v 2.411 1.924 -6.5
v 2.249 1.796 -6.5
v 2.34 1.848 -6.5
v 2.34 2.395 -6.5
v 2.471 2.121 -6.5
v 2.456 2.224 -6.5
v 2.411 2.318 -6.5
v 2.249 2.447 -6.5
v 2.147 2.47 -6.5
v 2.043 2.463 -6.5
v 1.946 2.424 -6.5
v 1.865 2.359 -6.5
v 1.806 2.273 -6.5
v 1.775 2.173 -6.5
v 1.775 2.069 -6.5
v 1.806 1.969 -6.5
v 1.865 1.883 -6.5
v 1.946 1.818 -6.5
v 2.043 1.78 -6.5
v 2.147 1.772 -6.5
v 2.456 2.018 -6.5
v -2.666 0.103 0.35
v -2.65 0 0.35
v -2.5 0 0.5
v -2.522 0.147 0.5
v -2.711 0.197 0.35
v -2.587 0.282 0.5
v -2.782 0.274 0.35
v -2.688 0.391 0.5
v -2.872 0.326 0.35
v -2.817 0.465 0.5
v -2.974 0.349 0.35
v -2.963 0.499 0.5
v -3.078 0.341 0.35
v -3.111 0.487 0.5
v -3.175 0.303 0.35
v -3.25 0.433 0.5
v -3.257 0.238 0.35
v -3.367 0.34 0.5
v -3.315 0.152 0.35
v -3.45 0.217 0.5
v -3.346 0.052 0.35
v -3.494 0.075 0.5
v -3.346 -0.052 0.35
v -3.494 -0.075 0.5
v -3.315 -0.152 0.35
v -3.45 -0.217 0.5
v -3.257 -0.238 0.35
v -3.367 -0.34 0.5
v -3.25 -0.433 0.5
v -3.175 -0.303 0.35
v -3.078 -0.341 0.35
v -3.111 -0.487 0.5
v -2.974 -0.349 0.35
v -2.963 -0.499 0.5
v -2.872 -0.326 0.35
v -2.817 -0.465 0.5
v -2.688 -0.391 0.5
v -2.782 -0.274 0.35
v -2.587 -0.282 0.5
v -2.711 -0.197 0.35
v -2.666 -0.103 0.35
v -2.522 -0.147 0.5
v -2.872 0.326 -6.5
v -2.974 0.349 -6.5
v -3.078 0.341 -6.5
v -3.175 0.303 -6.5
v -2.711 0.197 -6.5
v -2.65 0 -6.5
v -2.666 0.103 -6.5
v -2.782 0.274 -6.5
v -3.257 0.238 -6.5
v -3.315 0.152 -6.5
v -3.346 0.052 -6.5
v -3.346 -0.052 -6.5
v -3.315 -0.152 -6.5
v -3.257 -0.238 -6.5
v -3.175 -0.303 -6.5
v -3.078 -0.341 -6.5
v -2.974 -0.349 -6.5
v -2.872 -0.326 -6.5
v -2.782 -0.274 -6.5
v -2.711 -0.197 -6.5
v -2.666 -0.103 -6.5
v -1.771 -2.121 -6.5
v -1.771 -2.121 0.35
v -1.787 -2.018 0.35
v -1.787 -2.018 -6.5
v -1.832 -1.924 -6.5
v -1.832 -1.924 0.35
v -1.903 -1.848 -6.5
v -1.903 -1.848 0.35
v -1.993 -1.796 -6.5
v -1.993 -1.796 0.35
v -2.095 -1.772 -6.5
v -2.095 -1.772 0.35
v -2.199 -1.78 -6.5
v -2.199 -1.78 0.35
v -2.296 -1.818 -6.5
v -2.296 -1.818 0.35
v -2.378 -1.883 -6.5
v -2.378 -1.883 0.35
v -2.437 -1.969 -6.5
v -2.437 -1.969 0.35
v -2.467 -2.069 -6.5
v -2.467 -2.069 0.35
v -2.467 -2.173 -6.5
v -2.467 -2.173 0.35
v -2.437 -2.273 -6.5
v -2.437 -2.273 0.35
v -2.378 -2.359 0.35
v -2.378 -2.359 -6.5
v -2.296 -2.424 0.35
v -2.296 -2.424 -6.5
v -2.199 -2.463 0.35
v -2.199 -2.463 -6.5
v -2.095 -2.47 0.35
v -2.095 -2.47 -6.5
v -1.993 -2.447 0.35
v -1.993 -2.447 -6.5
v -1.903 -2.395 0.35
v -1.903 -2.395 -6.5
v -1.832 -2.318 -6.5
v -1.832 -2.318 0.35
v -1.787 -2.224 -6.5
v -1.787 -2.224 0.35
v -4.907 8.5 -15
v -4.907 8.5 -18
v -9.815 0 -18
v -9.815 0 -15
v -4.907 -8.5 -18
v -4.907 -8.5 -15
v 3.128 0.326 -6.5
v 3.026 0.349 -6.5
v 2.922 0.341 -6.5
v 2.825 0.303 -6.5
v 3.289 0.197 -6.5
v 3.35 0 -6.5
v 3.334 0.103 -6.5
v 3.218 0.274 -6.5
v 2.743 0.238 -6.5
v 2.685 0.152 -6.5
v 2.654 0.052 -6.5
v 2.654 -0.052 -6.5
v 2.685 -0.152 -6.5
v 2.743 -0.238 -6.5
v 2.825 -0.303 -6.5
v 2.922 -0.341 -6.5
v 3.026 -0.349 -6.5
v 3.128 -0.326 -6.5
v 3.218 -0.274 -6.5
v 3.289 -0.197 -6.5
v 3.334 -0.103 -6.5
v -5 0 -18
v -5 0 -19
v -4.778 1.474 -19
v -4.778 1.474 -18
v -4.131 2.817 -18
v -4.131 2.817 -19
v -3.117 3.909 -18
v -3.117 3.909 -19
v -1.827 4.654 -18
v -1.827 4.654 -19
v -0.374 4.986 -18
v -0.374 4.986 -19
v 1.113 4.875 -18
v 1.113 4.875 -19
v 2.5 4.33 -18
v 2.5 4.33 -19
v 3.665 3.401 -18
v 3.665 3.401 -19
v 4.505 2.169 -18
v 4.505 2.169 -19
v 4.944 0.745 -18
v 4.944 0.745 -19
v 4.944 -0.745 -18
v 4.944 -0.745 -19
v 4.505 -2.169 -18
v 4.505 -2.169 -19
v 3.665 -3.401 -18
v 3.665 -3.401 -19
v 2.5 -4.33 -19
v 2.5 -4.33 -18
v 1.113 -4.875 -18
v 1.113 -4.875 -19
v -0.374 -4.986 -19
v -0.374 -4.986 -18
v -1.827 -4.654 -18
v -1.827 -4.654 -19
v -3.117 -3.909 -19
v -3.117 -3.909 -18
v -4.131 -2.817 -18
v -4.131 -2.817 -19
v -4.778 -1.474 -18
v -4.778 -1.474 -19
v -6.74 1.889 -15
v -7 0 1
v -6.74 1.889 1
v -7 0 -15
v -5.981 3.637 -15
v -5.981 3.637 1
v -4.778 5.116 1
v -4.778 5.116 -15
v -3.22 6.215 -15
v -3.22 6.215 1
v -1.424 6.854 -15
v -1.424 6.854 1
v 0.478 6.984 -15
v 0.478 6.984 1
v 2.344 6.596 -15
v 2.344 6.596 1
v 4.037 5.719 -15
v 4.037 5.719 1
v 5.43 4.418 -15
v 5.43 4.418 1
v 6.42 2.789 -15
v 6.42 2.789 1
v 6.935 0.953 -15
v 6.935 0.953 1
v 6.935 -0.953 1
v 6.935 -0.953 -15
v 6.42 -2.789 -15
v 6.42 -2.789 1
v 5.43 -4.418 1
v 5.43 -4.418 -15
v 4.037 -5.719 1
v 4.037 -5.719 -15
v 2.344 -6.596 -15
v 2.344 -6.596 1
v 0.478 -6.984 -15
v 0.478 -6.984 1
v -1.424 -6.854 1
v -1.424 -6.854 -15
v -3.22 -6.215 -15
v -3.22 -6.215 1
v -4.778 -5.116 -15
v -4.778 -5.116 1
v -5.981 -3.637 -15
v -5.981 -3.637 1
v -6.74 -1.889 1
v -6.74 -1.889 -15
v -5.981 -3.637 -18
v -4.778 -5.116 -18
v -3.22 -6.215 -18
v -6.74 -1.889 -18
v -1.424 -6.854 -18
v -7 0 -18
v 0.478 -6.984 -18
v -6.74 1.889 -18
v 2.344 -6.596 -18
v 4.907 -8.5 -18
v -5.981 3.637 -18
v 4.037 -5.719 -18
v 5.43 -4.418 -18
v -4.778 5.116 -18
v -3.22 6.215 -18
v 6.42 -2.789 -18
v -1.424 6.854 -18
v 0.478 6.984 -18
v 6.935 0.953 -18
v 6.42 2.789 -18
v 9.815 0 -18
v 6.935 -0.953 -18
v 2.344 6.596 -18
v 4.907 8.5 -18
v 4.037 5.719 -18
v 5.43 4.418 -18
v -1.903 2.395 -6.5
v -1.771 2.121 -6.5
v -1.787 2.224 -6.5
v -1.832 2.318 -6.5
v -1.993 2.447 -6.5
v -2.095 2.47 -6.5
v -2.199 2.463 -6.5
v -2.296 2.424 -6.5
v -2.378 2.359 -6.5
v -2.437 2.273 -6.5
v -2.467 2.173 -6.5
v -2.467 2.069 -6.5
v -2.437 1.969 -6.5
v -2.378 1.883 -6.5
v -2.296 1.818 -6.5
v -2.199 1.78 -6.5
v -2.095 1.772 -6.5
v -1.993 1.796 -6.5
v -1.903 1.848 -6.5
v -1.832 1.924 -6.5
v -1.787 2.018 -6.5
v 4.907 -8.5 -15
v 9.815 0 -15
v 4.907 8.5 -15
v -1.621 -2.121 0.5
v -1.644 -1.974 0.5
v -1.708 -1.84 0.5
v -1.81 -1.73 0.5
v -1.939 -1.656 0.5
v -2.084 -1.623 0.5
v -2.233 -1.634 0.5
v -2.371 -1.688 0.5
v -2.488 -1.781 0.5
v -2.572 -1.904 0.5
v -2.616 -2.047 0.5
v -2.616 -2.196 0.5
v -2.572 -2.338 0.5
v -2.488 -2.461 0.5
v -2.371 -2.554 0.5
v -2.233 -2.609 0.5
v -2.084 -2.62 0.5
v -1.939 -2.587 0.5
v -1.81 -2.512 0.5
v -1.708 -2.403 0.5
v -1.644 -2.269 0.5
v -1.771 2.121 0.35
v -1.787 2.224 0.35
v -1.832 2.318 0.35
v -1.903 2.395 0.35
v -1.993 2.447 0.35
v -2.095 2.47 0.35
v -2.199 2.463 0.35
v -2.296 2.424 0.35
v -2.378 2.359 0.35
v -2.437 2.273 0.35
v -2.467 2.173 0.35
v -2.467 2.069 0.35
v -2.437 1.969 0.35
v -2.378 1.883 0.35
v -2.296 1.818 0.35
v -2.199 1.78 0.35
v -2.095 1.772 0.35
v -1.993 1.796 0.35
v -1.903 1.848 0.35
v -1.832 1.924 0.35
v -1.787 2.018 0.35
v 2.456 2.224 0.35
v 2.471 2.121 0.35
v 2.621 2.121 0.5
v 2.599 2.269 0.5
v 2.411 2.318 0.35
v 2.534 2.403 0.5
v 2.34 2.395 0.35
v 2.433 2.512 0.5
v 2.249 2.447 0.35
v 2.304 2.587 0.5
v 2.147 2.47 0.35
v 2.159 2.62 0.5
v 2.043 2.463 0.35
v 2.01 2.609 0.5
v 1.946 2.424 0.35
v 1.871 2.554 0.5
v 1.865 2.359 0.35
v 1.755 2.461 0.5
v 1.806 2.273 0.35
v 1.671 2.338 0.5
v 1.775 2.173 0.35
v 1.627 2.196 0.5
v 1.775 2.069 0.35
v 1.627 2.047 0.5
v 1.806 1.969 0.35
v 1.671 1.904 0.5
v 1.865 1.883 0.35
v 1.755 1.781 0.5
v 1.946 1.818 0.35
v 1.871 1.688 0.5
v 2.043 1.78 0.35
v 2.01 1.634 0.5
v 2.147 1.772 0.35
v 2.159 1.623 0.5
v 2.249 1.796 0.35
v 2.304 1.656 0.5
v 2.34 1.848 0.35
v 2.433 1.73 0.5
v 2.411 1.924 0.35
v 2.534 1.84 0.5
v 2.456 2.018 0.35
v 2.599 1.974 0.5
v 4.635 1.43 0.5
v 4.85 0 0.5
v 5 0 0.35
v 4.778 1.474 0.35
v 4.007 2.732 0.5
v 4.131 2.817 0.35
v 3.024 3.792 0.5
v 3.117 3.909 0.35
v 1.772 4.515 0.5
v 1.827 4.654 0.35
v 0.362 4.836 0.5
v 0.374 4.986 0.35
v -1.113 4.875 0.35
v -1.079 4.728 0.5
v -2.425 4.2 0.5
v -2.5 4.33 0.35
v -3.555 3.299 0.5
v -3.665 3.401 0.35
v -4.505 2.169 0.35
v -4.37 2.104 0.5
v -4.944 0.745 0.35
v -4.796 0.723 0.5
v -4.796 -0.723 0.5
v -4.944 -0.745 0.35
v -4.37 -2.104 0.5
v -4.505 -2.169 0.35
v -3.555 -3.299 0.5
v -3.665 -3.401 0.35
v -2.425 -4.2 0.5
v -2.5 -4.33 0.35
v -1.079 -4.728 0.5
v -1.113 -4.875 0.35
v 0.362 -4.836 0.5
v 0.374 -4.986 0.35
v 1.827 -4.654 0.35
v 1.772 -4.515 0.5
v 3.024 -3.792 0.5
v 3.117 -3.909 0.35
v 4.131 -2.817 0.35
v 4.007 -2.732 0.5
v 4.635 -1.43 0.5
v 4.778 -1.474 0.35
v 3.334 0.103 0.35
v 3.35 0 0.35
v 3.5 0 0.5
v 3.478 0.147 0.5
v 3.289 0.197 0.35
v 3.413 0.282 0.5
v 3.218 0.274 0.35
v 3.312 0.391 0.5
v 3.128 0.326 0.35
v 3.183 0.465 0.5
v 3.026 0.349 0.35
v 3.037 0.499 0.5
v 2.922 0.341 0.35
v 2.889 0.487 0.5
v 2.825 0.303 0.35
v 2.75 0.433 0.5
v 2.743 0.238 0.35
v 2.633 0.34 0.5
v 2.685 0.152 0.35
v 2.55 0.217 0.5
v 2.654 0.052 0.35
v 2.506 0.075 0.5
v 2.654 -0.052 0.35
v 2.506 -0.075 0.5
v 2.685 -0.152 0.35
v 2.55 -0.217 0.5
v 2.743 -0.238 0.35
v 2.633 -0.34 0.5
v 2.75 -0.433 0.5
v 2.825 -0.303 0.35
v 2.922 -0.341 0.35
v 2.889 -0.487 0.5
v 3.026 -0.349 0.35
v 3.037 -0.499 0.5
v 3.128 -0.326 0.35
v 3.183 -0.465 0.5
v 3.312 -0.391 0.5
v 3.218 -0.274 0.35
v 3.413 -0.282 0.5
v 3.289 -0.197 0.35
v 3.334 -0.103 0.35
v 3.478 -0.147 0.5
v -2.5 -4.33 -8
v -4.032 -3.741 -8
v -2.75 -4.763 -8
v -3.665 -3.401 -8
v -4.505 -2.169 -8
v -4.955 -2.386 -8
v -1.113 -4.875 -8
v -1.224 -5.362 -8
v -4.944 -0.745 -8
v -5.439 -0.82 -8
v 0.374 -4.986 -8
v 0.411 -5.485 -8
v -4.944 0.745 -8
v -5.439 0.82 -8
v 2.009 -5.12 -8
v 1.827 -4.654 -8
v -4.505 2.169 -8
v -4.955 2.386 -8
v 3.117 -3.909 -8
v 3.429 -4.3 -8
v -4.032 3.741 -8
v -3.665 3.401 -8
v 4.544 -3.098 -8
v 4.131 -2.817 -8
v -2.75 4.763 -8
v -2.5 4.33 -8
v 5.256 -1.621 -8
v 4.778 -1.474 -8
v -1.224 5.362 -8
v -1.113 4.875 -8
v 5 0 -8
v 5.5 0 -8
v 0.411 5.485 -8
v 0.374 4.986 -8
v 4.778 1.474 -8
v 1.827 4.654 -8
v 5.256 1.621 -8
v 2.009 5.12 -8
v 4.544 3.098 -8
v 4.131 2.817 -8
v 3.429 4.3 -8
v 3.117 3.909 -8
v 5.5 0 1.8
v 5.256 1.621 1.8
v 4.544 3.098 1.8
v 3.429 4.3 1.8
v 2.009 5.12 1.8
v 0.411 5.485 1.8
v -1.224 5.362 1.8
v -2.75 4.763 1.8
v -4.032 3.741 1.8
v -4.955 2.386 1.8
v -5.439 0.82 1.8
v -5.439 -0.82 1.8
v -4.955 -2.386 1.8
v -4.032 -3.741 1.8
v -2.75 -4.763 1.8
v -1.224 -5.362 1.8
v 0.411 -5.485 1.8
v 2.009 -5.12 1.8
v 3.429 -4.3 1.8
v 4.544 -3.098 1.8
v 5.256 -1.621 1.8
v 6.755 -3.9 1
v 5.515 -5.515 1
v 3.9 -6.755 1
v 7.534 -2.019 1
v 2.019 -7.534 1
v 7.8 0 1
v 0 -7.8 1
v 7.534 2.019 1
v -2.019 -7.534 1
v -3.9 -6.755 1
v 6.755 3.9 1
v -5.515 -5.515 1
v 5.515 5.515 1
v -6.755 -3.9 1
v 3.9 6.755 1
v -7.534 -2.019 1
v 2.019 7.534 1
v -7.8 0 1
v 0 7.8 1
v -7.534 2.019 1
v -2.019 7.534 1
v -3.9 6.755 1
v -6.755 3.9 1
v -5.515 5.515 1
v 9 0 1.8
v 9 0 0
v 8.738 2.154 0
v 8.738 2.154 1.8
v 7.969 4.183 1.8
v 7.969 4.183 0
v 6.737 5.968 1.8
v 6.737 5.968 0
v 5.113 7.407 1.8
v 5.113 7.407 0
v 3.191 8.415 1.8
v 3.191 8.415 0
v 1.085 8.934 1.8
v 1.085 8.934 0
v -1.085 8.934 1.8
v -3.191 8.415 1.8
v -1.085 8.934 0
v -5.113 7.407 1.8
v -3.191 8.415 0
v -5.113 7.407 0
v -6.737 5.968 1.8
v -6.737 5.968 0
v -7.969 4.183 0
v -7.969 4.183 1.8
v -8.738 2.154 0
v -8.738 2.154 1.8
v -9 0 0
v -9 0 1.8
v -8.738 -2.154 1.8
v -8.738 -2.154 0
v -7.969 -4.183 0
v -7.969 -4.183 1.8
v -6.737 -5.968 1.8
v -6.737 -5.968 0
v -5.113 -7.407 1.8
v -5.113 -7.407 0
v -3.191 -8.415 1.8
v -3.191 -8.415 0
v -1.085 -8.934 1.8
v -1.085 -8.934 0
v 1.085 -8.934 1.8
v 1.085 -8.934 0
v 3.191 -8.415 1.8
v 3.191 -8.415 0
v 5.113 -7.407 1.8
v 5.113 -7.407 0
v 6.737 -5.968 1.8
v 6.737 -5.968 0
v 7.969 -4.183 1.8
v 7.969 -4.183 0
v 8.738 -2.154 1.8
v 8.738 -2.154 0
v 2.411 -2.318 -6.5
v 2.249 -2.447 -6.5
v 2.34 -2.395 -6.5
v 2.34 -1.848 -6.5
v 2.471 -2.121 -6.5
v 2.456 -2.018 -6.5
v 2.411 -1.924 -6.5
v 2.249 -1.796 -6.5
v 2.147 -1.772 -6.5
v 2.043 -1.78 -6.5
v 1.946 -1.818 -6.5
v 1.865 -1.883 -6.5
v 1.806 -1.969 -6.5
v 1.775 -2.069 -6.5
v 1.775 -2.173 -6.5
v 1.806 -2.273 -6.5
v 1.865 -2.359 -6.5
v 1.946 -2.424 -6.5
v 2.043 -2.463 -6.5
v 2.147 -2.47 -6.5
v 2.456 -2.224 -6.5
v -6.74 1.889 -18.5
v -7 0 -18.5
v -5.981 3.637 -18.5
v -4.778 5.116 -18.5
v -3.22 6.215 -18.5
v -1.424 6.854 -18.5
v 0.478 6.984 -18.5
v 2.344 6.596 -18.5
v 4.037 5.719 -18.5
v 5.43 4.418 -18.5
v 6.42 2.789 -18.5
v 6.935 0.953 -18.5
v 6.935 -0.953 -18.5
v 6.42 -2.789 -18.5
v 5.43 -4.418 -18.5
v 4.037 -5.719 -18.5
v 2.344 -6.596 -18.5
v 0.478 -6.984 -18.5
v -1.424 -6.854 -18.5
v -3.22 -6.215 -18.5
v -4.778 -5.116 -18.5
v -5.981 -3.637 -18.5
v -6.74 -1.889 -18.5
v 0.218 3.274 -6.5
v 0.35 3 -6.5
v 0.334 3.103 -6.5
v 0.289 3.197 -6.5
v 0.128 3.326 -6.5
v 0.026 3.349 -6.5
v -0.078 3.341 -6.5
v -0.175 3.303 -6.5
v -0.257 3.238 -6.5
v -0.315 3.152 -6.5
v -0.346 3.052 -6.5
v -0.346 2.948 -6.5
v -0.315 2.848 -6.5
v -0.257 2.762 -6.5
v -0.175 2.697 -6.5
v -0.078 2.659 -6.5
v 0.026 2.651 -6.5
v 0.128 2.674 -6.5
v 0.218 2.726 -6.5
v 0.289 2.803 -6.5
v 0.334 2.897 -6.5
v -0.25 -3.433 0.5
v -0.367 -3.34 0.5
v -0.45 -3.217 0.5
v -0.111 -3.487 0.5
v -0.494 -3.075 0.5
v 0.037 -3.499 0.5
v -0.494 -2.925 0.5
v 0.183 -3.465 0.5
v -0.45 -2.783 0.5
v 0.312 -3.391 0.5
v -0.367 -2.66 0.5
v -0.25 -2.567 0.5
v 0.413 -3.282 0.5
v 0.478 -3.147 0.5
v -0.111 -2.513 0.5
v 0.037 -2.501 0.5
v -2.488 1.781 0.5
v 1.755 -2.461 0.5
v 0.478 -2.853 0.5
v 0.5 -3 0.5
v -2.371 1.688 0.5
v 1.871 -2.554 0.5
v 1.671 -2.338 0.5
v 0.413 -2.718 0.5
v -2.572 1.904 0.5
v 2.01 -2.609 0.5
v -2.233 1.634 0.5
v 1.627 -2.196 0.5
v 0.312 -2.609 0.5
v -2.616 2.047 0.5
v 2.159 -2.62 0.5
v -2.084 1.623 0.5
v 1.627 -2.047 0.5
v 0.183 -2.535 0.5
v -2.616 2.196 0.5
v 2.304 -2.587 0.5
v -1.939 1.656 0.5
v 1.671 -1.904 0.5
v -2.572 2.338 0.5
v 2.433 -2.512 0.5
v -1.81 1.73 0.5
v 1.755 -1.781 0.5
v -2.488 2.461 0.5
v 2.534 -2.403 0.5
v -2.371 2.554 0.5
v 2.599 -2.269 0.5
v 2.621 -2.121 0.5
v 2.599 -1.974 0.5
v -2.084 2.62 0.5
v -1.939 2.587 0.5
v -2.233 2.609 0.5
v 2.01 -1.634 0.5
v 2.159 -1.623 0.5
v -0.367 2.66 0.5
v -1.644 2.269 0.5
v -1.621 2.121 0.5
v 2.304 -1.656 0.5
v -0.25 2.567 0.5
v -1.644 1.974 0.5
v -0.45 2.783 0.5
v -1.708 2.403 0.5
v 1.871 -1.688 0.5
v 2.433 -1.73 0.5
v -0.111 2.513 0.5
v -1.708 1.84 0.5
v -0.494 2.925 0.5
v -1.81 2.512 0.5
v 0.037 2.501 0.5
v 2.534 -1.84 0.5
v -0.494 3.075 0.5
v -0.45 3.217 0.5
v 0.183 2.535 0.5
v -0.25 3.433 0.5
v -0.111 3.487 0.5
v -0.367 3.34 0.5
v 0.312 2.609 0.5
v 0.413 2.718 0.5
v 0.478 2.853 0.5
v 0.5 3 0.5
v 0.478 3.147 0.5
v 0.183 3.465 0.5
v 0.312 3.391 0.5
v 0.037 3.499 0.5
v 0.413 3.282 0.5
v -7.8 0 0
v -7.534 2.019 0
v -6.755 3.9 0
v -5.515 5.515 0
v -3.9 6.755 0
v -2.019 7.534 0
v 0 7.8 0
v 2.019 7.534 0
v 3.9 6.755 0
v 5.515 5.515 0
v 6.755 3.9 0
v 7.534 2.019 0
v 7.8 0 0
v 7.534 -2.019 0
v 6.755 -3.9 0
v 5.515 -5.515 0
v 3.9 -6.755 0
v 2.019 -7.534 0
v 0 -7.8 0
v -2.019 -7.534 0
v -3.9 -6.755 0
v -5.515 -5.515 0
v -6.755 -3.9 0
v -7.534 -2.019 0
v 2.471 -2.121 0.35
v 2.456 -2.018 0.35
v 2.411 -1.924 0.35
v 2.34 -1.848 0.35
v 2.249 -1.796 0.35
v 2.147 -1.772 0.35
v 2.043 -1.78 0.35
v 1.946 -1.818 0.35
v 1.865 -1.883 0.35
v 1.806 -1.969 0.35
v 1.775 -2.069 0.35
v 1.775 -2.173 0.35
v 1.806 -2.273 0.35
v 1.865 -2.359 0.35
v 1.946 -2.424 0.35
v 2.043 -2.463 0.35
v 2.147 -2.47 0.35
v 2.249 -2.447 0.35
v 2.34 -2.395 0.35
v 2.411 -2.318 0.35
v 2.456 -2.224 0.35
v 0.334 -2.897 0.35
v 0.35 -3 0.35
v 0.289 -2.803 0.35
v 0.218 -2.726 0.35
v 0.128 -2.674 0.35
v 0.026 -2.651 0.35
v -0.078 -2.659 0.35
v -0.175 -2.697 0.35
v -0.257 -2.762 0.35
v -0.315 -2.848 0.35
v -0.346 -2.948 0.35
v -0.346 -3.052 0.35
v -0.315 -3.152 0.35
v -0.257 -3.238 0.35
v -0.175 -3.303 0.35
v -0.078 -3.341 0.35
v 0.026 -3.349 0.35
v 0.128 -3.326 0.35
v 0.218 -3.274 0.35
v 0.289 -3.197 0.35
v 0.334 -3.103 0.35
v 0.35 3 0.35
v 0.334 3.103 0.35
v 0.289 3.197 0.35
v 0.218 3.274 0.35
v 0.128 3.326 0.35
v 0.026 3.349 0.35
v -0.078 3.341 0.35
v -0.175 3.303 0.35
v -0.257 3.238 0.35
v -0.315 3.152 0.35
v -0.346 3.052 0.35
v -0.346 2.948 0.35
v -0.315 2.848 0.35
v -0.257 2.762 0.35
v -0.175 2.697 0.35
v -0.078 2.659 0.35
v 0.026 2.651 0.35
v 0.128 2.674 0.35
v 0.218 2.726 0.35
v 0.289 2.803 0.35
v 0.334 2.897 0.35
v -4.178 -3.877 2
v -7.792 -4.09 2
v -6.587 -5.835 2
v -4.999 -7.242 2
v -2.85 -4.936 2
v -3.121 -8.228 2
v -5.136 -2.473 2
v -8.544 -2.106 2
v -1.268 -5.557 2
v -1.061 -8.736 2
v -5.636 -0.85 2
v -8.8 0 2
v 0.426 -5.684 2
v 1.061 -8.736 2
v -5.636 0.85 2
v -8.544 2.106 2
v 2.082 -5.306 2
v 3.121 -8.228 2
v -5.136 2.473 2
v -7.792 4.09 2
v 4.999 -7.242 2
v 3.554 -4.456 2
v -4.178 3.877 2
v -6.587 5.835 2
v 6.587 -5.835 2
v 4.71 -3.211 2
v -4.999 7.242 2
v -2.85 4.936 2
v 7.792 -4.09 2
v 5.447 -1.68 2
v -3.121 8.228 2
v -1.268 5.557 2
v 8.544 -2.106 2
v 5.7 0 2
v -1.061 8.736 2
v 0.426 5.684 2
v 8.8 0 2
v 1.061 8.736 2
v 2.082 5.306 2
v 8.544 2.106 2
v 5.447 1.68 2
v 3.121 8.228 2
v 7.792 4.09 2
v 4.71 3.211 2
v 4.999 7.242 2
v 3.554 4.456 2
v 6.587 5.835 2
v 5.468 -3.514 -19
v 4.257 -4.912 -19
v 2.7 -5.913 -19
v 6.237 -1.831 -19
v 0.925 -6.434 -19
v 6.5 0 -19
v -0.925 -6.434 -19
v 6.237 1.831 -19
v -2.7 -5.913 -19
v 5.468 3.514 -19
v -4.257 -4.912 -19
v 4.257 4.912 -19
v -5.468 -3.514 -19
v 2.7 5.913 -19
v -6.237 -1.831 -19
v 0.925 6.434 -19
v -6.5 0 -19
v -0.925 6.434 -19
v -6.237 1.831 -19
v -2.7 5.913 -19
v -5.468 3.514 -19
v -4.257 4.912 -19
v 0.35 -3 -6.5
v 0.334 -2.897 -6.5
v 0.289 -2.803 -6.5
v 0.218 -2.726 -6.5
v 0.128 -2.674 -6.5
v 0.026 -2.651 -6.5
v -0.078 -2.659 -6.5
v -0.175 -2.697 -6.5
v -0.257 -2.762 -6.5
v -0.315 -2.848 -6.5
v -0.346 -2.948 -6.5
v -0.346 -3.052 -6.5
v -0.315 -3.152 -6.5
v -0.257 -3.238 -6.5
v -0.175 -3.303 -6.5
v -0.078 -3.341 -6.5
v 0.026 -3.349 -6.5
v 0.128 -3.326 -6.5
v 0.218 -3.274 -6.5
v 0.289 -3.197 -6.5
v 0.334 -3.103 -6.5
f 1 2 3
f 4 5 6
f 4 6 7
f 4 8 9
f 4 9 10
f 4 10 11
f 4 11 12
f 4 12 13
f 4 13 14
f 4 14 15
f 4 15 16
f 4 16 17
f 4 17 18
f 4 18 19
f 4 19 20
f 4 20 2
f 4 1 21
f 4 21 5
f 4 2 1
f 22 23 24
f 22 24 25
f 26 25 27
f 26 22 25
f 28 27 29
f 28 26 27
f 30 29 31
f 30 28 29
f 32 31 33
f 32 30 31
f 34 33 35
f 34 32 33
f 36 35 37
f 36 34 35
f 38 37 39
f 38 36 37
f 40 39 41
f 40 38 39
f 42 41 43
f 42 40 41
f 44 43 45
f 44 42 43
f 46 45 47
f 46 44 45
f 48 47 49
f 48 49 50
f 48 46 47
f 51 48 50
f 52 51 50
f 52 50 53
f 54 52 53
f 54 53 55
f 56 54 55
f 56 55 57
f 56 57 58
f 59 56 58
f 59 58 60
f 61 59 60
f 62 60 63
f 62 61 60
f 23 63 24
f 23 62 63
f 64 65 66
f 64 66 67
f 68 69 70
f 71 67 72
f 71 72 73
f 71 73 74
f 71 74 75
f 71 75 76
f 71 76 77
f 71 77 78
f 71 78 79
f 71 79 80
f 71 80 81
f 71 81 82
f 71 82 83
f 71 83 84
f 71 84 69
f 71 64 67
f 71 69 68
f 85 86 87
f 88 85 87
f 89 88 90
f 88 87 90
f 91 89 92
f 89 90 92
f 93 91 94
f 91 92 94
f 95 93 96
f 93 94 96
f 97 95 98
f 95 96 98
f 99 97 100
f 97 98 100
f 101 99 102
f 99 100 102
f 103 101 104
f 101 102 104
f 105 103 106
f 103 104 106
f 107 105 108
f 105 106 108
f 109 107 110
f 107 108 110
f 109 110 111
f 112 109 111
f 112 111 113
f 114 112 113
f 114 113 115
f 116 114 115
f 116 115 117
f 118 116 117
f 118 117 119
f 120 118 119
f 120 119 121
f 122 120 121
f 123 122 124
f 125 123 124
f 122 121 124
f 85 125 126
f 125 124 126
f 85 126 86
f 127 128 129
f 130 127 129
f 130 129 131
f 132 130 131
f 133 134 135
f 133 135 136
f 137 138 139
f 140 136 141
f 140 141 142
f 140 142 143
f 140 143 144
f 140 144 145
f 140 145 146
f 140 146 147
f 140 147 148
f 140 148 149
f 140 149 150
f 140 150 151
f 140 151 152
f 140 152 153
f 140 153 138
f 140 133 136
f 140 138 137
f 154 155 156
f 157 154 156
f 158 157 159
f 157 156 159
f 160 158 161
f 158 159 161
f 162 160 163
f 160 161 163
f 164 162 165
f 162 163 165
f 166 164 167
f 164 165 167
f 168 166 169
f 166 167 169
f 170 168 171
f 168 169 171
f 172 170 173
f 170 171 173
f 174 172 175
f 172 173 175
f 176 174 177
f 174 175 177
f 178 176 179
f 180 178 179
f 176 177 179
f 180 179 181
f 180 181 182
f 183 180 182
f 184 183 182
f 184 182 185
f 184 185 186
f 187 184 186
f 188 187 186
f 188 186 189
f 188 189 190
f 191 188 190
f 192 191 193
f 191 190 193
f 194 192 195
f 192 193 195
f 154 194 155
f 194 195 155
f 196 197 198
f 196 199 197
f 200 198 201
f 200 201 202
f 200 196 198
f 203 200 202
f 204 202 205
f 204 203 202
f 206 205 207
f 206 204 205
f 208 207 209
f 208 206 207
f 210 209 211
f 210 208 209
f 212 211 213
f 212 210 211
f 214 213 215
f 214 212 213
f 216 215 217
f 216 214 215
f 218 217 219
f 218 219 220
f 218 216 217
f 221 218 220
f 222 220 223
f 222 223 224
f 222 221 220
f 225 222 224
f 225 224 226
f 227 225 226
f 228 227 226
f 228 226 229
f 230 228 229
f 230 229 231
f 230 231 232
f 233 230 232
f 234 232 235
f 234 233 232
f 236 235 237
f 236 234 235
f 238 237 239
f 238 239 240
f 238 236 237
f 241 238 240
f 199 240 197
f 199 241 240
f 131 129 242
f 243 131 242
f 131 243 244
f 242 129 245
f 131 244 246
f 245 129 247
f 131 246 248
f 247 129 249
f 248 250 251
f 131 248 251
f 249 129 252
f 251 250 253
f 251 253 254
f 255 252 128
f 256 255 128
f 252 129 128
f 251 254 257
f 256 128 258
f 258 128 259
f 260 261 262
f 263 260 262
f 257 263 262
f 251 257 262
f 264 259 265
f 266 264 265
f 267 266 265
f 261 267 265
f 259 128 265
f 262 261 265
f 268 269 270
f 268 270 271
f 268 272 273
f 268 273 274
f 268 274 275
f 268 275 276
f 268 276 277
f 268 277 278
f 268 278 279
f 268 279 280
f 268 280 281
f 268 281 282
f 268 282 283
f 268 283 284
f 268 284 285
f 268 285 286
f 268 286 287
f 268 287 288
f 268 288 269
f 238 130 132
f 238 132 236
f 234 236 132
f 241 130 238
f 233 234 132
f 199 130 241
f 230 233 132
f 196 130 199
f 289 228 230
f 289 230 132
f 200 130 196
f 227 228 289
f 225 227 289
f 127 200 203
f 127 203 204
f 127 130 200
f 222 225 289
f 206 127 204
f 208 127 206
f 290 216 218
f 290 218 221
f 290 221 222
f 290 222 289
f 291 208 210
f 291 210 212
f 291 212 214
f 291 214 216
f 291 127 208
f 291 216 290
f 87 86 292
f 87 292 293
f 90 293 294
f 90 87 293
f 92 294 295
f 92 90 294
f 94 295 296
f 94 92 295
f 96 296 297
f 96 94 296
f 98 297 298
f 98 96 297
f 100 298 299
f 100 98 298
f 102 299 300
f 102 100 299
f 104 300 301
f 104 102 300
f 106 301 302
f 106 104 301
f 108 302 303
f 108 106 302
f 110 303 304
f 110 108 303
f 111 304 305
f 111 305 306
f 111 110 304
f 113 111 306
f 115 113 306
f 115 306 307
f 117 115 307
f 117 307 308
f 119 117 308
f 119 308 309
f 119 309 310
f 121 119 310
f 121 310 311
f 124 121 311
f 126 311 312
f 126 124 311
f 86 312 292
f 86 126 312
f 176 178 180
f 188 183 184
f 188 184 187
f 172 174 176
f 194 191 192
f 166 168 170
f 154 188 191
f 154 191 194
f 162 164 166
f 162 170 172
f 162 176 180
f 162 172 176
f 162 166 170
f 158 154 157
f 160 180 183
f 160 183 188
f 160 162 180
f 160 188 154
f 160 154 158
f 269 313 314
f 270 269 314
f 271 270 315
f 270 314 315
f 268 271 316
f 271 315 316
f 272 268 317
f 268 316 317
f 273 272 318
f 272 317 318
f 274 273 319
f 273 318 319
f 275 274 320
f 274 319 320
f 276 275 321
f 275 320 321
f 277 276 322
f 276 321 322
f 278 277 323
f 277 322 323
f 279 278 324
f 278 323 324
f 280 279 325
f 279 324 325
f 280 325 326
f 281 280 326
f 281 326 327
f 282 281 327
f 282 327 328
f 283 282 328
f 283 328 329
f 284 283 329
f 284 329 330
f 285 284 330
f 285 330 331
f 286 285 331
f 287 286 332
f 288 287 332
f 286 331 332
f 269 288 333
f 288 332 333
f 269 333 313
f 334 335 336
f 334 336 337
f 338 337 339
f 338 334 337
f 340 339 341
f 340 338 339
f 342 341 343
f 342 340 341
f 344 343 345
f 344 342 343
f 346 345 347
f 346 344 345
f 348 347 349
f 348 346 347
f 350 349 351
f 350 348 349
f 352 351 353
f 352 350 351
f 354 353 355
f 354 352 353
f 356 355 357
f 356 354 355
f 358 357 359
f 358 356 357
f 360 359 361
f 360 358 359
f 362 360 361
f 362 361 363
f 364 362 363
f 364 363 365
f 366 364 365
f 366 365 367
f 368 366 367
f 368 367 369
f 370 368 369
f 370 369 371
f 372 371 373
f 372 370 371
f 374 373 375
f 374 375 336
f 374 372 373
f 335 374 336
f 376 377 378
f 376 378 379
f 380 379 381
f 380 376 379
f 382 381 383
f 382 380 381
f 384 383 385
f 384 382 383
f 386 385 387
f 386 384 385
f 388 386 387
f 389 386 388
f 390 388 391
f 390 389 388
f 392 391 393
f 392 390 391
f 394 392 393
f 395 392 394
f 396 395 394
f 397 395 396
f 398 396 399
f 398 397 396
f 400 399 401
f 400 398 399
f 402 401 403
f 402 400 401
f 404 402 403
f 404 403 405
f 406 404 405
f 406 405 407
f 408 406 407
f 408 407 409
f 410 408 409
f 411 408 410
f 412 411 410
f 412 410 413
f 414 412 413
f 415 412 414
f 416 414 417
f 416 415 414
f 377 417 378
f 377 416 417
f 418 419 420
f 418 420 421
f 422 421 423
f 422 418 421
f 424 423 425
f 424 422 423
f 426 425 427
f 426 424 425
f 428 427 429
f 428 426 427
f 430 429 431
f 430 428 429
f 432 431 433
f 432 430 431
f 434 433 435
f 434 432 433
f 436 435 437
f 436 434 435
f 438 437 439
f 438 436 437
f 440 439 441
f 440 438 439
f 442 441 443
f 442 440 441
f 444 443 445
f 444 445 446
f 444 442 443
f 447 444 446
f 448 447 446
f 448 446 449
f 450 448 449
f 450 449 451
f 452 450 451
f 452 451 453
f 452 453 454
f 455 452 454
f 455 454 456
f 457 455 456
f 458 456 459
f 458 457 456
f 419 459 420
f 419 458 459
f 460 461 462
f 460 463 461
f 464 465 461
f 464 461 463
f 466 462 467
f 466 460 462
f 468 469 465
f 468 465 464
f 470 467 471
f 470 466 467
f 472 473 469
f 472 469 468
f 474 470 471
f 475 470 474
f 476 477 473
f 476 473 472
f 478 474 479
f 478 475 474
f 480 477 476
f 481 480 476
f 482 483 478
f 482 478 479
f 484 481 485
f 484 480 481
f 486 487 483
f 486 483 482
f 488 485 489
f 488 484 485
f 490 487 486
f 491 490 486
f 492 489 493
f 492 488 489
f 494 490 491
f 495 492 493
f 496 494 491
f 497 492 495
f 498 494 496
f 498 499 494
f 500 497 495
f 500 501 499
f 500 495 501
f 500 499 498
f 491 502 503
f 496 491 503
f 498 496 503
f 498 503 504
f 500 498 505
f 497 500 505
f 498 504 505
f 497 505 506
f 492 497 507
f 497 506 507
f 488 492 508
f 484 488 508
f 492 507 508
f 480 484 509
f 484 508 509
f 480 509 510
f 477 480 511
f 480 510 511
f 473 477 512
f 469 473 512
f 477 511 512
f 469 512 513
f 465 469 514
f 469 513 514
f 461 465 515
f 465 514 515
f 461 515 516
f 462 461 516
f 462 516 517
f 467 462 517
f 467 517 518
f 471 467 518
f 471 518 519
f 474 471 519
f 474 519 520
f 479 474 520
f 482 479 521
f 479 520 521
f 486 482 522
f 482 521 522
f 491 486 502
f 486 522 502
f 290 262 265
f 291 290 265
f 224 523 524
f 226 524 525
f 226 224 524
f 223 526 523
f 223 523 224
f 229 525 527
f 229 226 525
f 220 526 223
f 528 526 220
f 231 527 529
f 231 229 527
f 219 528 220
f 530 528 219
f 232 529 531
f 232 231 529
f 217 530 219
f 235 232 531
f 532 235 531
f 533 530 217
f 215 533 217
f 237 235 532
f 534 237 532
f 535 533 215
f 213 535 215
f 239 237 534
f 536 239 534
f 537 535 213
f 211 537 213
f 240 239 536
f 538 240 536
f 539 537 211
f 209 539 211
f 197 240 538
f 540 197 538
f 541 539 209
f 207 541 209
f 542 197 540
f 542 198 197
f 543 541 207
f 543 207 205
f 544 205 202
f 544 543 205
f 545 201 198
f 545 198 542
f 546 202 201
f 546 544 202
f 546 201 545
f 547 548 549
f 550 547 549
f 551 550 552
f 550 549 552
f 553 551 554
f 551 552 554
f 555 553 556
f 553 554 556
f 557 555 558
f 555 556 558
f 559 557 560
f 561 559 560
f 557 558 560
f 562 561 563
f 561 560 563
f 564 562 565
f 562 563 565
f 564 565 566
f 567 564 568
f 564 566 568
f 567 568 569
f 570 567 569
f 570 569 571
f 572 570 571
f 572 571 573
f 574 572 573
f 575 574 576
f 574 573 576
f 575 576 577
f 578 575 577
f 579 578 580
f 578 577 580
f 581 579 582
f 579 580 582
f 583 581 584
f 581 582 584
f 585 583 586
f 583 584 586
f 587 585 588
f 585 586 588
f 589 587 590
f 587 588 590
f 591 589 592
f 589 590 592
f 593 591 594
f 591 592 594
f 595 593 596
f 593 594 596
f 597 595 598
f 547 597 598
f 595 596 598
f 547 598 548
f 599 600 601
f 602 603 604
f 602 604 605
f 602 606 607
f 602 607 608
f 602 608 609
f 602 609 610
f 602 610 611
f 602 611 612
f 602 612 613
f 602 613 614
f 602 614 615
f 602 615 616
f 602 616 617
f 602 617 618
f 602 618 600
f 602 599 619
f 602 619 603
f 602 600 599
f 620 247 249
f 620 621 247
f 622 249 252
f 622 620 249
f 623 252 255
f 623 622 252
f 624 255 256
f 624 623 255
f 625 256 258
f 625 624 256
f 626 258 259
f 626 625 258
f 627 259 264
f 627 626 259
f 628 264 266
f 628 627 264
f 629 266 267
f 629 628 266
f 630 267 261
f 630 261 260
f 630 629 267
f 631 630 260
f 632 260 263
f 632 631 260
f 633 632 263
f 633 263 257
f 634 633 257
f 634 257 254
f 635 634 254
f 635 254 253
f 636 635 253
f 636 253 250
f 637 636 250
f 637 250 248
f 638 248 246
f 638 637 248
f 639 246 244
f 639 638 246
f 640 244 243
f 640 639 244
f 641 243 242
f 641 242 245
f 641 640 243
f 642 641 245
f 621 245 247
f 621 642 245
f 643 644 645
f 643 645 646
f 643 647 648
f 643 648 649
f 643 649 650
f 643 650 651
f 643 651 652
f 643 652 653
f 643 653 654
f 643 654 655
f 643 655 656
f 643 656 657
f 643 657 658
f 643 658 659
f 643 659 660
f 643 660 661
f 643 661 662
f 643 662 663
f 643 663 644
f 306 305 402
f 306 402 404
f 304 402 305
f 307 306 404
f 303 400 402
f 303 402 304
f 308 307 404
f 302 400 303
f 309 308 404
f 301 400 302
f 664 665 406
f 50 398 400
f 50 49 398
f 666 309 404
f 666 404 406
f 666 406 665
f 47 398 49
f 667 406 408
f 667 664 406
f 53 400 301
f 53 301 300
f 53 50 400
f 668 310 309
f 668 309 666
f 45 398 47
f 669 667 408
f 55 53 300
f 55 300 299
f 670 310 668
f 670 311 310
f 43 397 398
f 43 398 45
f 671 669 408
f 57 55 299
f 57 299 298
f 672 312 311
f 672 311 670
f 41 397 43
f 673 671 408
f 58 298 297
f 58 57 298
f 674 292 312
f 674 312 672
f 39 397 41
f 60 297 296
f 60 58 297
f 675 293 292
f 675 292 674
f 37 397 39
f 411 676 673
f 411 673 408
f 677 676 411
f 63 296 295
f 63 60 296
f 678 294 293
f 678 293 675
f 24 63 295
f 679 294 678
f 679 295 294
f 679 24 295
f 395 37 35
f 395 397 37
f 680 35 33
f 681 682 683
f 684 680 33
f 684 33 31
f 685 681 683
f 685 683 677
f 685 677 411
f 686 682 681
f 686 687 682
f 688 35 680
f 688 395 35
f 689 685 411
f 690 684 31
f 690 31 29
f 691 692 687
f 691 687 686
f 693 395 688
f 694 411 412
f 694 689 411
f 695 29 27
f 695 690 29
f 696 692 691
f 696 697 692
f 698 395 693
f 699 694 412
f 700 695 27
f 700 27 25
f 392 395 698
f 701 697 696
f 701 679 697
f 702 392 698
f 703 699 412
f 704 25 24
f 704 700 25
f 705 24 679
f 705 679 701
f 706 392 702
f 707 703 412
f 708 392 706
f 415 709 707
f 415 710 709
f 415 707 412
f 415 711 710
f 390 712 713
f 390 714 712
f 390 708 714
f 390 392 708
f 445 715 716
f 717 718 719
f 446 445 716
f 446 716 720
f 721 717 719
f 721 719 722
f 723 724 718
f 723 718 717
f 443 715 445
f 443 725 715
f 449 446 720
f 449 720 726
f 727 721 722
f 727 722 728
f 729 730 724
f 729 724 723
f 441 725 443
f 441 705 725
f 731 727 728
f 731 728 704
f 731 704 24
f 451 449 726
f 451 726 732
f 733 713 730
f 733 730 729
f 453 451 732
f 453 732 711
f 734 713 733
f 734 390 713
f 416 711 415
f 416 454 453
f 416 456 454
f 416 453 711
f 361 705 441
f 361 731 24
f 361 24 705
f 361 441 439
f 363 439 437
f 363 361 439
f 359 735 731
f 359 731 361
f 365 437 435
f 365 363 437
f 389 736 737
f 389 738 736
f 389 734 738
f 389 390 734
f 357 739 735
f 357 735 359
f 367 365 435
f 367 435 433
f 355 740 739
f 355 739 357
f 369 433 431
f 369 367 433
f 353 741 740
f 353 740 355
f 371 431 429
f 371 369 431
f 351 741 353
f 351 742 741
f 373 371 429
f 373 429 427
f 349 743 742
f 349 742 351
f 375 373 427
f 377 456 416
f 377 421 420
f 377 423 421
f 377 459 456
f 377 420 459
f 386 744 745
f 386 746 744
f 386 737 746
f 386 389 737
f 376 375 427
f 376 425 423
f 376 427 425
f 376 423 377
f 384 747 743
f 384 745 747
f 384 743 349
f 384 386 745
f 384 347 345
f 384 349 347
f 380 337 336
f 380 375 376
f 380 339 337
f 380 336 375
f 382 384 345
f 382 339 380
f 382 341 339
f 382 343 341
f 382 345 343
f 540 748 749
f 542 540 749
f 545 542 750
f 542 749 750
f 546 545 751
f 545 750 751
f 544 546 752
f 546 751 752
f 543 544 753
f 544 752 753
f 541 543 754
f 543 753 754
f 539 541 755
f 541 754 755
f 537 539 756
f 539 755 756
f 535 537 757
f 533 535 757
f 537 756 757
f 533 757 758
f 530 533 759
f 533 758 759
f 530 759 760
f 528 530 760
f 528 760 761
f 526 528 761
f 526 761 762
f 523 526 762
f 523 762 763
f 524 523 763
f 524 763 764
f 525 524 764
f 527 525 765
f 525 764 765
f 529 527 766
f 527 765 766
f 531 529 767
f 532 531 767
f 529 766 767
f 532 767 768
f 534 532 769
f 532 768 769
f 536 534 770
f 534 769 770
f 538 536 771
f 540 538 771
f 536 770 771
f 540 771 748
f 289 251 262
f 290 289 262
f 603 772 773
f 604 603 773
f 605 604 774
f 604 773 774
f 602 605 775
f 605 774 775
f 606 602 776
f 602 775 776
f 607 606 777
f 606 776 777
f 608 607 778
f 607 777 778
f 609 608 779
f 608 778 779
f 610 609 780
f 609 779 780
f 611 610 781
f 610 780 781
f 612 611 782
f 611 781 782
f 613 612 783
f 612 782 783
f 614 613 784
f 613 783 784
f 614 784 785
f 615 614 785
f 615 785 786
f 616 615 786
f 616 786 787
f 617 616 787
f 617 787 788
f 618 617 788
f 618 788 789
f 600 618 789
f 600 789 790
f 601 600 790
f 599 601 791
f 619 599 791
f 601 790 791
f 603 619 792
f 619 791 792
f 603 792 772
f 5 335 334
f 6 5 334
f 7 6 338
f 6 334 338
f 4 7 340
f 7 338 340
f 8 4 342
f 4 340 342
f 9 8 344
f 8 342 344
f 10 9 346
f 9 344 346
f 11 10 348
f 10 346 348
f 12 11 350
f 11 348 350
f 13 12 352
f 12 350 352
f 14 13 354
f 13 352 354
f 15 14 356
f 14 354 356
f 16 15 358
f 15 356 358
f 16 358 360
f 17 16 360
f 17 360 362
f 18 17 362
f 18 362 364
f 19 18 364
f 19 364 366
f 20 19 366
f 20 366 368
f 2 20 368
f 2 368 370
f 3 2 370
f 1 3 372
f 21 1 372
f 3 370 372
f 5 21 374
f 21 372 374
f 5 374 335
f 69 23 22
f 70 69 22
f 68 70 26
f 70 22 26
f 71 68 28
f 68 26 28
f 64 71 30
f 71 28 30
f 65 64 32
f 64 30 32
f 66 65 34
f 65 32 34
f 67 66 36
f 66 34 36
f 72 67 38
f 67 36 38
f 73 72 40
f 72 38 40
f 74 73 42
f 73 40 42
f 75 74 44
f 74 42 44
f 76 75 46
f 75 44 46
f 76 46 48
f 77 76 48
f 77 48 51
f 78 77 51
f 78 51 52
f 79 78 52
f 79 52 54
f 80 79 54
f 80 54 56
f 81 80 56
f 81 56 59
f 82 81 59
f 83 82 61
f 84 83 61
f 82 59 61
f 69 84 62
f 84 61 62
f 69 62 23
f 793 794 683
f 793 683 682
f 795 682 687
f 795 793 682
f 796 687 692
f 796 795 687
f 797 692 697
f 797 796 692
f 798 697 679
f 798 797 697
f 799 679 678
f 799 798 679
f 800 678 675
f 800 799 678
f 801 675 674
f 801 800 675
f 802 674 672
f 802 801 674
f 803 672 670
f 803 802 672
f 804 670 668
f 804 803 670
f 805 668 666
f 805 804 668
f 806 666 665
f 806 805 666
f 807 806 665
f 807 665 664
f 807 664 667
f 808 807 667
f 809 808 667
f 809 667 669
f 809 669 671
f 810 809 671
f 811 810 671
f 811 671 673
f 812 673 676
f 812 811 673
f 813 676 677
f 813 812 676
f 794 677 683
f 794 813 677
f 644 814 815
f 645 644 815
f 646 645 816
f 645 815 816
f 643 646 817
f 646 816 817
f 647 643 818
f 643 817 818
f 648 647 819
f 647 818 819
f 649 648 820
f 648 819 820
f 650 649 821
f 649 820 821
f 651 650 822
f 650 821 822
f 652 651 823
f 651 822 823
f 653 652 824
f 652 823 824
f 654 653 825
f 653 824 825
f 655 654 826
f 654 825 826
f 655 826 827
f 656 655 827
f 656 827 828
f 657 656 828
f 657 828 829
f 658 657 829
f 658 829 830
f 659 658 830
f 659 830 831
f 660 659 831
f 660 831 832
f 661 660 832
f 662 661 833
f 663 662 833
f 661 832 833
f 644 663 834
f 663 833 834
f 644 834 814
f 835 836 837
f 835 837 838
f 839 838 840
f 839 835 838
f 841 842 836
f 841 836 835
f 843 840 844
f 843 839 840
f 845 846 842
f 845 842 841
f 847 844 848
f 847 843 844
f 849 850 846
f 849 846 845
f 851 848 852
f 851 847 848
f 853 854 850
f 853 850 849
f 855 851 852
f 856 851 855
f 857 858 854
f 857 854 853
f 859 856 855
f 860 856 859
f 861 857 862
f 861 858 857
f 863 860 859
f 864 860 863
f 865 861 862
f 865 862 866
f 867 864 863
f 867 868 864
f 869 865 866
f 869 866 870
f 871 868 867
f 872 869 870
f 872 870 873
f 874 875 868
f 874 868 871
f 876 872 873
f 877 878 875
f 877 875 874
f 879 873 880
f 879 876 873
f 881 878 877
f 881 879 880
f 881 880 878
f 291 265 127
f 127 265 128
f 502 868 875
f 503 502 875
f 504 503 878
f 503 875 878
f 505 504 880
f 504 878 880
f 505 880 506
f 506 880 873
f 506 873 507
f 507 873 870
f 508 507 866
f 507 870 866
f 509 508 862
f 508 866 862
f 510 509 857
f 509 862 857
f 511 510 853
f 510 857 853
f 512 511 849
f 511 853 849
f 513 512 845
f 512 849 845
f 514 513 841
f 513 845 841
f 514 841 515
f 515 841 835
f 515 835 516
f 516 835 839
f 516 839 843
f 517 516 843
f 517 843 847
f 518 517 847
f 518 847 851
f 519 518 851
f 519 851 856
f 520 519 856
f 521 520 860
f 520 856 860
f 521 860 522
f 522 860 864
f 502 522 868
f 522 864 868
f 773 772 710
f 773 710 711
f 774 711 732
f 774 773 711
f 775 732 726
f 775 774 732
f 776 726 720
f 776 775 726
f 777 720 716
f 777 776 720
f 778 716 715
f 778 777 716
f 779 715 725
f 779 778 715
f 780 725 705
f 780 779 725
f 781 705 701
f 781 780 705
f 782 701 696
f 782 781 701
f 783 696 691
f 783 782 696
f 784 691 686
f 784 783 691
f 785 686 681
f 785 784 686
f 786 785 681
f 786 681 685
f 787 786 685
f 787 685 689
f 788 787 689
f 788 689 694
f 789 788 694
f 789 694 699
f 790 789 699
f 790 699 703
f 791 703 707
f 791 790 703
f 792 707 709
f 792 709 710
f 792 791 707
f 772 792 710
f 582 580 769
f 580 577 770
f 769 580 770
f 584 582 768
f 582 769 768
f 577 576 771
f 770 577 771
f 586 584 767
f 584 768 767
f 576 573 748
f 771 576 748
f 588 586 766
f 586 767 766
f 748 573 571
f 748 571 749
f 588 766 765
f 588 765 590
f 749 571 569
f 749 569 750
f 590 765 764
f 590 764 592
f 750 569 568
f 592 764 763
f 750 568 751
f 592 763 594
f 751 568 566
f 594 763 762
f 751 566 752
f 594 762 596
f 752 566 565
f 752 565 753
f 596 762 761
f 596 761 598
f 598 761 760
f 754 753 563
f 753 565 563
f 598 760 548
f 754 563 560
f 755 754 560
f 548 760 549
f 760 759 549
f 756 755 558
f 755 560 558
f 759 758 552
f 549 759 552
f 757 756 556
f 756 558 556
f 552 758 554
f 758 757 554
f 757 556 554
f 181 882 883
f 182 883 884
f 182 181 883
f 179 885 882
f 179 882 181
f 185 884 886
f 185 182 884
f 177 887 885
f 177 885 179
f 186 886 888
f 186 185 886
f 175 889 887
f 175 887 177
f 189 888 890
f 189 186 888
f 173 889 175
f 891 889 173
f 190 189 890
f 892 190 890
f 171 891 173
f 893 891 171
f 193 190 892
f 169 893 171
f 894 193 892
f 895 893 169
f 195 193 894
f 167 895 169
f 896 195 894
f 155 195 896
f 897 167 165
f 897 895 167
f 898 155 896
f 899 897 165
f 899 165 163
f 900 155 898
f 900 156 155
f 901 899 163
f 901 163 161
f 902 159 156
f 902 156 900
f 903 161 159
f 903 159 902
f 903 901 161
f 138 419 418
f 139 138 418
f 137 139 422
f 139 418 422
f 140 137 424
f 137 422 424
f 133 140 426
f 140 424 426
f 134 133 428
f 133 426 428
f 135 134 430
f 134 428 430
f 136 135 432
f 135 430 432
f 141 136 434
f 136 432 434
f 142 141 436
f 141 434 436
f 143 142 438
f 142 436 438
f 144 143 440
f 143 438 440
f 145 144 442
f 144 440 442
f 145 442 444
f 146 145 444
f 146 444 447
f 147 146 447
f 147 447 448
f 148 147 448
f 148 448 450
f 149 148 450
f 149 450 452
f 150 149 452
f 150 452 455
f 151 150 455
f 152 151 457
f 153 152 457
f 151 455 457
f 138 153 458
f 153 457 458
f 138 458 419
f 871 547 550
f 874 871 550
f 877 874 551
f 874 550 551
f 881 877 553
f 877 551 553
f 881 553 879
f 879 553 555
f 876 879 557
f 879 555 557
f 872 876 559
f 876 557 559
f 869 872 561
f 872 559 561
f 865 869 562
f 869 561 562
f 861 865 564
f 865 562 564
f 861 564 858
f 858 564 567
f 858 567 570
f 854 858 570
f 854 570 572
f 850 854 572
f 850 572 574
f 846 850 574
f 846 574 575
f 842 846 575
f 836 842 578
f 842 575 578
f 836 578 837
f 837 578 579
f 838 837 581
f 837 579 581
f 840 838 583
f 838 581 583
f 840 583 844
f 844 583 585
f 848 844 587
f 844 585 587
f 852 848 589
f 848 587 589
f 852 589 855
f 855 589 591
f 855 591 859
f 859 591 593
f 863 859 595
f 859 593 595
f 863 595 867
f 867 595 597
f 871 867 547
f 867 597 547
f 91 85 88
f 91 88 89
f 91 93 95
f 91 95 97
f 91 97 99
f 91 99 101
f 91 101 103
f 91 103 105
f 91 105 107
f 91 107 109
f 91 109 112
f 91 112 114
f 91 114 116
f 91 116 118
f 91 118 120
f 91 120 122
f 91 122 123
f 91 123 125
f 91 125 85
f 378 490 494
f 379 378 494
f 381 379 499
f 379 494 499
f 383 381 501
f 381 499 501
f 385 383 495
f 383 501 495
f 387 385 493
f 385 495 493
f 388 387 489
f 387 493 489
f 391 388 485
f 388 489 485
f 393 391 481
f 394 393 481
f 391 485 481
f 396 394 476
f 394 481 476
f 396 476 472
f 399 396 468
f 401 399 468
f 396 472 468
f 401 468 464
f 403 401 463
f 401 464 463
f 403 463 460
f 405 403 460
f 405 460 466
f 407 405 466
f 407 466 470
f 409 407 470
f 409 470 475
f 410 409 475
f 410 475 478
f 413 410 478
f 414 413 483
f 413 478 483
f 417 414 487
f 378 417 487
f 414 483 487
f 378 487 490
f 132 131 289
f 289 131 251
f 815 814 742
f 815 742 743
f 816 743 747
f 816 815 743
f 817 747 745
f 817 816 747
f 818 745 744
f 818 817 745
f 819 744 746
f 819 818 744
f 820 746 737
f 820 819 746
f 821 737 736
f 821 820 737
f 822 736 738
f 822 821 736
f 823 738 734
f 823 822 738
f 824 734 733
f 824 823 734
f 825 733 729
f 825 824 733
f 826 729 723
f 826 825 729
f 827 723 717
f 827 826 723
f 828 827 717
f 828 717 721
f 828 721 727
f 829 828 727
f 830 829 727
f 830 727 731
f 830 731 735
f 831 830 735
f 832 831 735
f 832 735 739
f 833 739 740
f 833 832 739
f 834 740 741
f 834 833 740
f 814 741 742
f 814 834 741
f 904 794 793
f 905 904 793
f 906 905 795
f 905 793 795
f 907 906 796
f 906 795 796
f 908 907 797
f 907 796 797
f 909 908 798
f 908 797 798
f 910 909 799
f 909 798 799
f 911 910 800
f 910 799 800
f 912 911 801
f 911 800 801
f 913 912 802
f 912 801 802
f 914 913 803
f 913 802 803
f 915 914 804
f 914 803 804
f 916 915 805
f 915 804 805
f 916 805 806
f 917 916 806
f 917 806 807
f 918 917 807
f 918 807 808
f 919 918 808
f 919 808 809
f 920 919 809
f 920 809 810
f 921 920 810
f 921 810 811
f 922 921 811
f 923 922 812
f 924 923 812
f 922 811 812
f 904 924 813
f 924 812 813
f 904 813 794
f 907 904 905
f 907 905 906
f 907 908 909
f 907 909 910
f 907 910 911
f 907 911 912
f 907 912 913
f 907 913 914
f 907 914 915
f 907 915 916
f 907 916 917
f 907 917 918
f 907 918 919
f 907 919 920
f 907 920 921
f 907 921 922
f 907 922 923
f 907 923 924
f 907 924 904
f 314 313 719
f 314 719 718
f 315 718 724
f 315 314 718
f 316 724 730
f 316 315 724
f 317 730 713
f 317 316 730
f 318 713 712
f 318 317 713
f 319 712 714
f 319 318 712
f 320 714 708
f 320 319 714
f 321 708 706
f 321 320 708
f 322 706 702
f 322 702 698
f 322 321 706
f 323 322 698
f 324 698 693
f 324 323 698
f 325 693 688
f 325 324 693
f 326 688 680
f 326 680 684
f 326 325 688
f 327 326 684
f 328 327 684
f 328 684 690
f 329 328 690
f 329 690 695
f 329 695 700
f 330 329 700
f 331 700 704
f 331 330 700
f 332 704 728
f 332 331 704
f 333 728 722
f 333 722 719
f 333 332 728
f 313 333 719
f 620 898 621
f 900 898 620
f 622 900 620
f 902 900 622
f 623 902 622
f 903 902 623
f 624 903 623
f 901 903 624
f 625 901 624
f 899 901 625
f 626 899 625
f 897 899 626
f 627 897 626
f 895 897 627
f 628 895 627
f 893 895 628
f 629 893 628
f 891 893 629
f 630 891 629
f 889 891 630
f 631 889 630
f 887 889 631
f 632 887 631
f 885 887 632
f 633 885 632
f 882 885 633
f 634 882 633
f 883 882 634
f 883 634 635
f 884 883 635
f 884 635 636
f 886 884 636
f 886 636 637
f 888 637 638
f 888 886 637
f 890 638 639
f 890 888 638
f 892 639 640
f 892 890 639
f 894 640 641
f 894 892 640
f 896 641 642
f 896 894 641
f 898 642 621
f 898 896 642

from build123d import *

# Parameters (mm, degrees)
SKETCH1_R          = 9
EXTRUDE1_DEPTH     = 2
SKETCH4_R          = 7
EXTRUDE2_DEPTH     = 19
SKETCH2_R          = 5.5
CUT_EXTRUDE1_DEPTH = 10
SKETCH3_R          = 7.8
SKETCH3_R_2        = 7
CUT_EXTRUDE2_DEPTH = 1
SKETCH5_R          = 5
EXTRUDE3_DEPTH     = 8.5
SKETCH6_R          = 0.35
CUT_EXTRUDE3_DEPTH = 7
CHAMFER2_SIZE      = 0.15
CHAMFER1_SIZE      = 0.2
SKETCH7_R          = 5
CUT_EXTRUDE4_DEPTH = 1
CHAMFER3_SIZE      = 0.5
EXTRUDE4_DEPTH     = 3


with BuildPart() as part:
    # Sketch1 → Extrude1 (new body)
    with BuildSketch(Plane.XY):
        Circle(SKETCH1_R)
    extrude(amount=EXTRUDE1_DEPTH)

    # Sketch4 → Extrude2 (add)
    with BuildSketch(Plane(origin=(0, 0, 0), x_dir=(-1, 0, 0), z_dir=(0, 0, -1))):
        Circle(SKETCH4_R)
    extrude(amount=EXTRUDE2_DEPTH)

    # Sketch2 → Cut-Extrude1 (cut)
    with BuildSketch(Plane.XY.offset(2)):
        Circle(SKETCH2_R)
    extrude(amount=-CUT_EXTRUDE1_DEPTH, mode=Mode.SUBTRACT)

    # Sketch3 → Cut-Extrude2 (cut)
    with BuildSketch(Plane(origin=(0, 0, 0), x_dir=(-1, 0, 0), z_dir=(0, 0, -1))):
        Circle(SKETCH3_R)
        Circle(SKETCH3_R_2, mode=Mode.SUBTRACT)
    extrude(amount=-CUT_EXTRUDE2_DEPTH, mode=Mode.SUBTRACT)

    # Sketch5 → Extrude3 (add)
    with BuildSketch(Plane.XY.offset(-8)):
        Circle(SKETCH5_R)
    extrude(amount=EXTRUDE3_DEPTH)

    # Sketch6 → Cut-Extrude3 (cut)
    with BuildSketch(Plane.XY.offset(0.5)):
        with Locations((0, 3)):
            Circle(SKETCH6_R)
        with Locations((0, -3)):
            Circle(SKETCH6_R)
        with Locations((2.121320344, 2.121320344)):
            Circle(SKETCH6_R)
        with Locations((2.121320344, -2.121320344)):
            Circle(SKETCH6_R)
        with Locations((-2.121320344, 2.121320344)):
            Circle(SKETCH6_R)
        with Locations((-2.121320344, -2.121320344)):
            Circle(SKETCH6_R)
        with Locations((-3, 0)):
            Circle(SKETCH6_R)
        with Locations((3, 0)):
            Circle(SKETCH6_R)
    extrude(amount=-CUT_EXTRUDE3_DEPTH, mode=Mode.SUBTRACT)

    # Chamfer2
    chamfer2_edges = [part.edges().sort_by_distance(p)[0] for p in [
        (-5, 0, 0.5),
        (-0.35, 3, 0.5),
        (-0.35, -3, 0.5),
        (1.771320344, 2.121320344, 0.5),
        (1.771320344, -2.121320344, 0.5),
        (-2.471320344, 2.121320344, 0.5),
        (-2.471320344, -2.121320344, 0.5),
        (-3.35, 0, 0.5),
        (2.65, 0, 0.5),
    ]]
    chamfer(chamfer2_edges, length=CHAMFER2_SIZE)

    # Chamfer1
    chamfer1_edges = [part.edges().sort_by_distance(p)[0] for p in [
        (-5.5, 0, 2),
        (-9, 0, 2),
    ]]
    chamfer(chamfer1_edges, length=CHAMFER1_SIZE)

    # Sketch7 → Cut-Extrude4 (cut)
    with BuildSketch(Plane(origin=(0, 0, -19), x_dir=(-1, 0, 0), z_dir=(0, 0, -1))):
        Circle(SKETCH7_R)
    extrude(amount=-CUT_EXTRUDE4_DEPTH, mode=Mode.SUBTRACT)

    # Chamfer3
    chamfer3_edges = [part.edges().sort_by_distance(p)[0] for p in [
        (7, 0, -19),
    ]]
    chamfer(chamfer3_edges, length=CHAMFER3_SIZE)

    # Sketch9 → Extrude4 (add)
    with BuildSketch(Plane(origin=(0, 0, -18), x_dir=(-1, 0, 0), z_dir=(0, 0, -1))):
        Polygon((-4.907477288, 8.5), (4.907477288, 8.5), (9.814954576, 0), (4.907477288, -8.5), (-4.907477288, -8.5), (-9.814954576, 0), align=None)
    extrude(amount=-EXTRUDE4_DEPTH)


solid = part.part
